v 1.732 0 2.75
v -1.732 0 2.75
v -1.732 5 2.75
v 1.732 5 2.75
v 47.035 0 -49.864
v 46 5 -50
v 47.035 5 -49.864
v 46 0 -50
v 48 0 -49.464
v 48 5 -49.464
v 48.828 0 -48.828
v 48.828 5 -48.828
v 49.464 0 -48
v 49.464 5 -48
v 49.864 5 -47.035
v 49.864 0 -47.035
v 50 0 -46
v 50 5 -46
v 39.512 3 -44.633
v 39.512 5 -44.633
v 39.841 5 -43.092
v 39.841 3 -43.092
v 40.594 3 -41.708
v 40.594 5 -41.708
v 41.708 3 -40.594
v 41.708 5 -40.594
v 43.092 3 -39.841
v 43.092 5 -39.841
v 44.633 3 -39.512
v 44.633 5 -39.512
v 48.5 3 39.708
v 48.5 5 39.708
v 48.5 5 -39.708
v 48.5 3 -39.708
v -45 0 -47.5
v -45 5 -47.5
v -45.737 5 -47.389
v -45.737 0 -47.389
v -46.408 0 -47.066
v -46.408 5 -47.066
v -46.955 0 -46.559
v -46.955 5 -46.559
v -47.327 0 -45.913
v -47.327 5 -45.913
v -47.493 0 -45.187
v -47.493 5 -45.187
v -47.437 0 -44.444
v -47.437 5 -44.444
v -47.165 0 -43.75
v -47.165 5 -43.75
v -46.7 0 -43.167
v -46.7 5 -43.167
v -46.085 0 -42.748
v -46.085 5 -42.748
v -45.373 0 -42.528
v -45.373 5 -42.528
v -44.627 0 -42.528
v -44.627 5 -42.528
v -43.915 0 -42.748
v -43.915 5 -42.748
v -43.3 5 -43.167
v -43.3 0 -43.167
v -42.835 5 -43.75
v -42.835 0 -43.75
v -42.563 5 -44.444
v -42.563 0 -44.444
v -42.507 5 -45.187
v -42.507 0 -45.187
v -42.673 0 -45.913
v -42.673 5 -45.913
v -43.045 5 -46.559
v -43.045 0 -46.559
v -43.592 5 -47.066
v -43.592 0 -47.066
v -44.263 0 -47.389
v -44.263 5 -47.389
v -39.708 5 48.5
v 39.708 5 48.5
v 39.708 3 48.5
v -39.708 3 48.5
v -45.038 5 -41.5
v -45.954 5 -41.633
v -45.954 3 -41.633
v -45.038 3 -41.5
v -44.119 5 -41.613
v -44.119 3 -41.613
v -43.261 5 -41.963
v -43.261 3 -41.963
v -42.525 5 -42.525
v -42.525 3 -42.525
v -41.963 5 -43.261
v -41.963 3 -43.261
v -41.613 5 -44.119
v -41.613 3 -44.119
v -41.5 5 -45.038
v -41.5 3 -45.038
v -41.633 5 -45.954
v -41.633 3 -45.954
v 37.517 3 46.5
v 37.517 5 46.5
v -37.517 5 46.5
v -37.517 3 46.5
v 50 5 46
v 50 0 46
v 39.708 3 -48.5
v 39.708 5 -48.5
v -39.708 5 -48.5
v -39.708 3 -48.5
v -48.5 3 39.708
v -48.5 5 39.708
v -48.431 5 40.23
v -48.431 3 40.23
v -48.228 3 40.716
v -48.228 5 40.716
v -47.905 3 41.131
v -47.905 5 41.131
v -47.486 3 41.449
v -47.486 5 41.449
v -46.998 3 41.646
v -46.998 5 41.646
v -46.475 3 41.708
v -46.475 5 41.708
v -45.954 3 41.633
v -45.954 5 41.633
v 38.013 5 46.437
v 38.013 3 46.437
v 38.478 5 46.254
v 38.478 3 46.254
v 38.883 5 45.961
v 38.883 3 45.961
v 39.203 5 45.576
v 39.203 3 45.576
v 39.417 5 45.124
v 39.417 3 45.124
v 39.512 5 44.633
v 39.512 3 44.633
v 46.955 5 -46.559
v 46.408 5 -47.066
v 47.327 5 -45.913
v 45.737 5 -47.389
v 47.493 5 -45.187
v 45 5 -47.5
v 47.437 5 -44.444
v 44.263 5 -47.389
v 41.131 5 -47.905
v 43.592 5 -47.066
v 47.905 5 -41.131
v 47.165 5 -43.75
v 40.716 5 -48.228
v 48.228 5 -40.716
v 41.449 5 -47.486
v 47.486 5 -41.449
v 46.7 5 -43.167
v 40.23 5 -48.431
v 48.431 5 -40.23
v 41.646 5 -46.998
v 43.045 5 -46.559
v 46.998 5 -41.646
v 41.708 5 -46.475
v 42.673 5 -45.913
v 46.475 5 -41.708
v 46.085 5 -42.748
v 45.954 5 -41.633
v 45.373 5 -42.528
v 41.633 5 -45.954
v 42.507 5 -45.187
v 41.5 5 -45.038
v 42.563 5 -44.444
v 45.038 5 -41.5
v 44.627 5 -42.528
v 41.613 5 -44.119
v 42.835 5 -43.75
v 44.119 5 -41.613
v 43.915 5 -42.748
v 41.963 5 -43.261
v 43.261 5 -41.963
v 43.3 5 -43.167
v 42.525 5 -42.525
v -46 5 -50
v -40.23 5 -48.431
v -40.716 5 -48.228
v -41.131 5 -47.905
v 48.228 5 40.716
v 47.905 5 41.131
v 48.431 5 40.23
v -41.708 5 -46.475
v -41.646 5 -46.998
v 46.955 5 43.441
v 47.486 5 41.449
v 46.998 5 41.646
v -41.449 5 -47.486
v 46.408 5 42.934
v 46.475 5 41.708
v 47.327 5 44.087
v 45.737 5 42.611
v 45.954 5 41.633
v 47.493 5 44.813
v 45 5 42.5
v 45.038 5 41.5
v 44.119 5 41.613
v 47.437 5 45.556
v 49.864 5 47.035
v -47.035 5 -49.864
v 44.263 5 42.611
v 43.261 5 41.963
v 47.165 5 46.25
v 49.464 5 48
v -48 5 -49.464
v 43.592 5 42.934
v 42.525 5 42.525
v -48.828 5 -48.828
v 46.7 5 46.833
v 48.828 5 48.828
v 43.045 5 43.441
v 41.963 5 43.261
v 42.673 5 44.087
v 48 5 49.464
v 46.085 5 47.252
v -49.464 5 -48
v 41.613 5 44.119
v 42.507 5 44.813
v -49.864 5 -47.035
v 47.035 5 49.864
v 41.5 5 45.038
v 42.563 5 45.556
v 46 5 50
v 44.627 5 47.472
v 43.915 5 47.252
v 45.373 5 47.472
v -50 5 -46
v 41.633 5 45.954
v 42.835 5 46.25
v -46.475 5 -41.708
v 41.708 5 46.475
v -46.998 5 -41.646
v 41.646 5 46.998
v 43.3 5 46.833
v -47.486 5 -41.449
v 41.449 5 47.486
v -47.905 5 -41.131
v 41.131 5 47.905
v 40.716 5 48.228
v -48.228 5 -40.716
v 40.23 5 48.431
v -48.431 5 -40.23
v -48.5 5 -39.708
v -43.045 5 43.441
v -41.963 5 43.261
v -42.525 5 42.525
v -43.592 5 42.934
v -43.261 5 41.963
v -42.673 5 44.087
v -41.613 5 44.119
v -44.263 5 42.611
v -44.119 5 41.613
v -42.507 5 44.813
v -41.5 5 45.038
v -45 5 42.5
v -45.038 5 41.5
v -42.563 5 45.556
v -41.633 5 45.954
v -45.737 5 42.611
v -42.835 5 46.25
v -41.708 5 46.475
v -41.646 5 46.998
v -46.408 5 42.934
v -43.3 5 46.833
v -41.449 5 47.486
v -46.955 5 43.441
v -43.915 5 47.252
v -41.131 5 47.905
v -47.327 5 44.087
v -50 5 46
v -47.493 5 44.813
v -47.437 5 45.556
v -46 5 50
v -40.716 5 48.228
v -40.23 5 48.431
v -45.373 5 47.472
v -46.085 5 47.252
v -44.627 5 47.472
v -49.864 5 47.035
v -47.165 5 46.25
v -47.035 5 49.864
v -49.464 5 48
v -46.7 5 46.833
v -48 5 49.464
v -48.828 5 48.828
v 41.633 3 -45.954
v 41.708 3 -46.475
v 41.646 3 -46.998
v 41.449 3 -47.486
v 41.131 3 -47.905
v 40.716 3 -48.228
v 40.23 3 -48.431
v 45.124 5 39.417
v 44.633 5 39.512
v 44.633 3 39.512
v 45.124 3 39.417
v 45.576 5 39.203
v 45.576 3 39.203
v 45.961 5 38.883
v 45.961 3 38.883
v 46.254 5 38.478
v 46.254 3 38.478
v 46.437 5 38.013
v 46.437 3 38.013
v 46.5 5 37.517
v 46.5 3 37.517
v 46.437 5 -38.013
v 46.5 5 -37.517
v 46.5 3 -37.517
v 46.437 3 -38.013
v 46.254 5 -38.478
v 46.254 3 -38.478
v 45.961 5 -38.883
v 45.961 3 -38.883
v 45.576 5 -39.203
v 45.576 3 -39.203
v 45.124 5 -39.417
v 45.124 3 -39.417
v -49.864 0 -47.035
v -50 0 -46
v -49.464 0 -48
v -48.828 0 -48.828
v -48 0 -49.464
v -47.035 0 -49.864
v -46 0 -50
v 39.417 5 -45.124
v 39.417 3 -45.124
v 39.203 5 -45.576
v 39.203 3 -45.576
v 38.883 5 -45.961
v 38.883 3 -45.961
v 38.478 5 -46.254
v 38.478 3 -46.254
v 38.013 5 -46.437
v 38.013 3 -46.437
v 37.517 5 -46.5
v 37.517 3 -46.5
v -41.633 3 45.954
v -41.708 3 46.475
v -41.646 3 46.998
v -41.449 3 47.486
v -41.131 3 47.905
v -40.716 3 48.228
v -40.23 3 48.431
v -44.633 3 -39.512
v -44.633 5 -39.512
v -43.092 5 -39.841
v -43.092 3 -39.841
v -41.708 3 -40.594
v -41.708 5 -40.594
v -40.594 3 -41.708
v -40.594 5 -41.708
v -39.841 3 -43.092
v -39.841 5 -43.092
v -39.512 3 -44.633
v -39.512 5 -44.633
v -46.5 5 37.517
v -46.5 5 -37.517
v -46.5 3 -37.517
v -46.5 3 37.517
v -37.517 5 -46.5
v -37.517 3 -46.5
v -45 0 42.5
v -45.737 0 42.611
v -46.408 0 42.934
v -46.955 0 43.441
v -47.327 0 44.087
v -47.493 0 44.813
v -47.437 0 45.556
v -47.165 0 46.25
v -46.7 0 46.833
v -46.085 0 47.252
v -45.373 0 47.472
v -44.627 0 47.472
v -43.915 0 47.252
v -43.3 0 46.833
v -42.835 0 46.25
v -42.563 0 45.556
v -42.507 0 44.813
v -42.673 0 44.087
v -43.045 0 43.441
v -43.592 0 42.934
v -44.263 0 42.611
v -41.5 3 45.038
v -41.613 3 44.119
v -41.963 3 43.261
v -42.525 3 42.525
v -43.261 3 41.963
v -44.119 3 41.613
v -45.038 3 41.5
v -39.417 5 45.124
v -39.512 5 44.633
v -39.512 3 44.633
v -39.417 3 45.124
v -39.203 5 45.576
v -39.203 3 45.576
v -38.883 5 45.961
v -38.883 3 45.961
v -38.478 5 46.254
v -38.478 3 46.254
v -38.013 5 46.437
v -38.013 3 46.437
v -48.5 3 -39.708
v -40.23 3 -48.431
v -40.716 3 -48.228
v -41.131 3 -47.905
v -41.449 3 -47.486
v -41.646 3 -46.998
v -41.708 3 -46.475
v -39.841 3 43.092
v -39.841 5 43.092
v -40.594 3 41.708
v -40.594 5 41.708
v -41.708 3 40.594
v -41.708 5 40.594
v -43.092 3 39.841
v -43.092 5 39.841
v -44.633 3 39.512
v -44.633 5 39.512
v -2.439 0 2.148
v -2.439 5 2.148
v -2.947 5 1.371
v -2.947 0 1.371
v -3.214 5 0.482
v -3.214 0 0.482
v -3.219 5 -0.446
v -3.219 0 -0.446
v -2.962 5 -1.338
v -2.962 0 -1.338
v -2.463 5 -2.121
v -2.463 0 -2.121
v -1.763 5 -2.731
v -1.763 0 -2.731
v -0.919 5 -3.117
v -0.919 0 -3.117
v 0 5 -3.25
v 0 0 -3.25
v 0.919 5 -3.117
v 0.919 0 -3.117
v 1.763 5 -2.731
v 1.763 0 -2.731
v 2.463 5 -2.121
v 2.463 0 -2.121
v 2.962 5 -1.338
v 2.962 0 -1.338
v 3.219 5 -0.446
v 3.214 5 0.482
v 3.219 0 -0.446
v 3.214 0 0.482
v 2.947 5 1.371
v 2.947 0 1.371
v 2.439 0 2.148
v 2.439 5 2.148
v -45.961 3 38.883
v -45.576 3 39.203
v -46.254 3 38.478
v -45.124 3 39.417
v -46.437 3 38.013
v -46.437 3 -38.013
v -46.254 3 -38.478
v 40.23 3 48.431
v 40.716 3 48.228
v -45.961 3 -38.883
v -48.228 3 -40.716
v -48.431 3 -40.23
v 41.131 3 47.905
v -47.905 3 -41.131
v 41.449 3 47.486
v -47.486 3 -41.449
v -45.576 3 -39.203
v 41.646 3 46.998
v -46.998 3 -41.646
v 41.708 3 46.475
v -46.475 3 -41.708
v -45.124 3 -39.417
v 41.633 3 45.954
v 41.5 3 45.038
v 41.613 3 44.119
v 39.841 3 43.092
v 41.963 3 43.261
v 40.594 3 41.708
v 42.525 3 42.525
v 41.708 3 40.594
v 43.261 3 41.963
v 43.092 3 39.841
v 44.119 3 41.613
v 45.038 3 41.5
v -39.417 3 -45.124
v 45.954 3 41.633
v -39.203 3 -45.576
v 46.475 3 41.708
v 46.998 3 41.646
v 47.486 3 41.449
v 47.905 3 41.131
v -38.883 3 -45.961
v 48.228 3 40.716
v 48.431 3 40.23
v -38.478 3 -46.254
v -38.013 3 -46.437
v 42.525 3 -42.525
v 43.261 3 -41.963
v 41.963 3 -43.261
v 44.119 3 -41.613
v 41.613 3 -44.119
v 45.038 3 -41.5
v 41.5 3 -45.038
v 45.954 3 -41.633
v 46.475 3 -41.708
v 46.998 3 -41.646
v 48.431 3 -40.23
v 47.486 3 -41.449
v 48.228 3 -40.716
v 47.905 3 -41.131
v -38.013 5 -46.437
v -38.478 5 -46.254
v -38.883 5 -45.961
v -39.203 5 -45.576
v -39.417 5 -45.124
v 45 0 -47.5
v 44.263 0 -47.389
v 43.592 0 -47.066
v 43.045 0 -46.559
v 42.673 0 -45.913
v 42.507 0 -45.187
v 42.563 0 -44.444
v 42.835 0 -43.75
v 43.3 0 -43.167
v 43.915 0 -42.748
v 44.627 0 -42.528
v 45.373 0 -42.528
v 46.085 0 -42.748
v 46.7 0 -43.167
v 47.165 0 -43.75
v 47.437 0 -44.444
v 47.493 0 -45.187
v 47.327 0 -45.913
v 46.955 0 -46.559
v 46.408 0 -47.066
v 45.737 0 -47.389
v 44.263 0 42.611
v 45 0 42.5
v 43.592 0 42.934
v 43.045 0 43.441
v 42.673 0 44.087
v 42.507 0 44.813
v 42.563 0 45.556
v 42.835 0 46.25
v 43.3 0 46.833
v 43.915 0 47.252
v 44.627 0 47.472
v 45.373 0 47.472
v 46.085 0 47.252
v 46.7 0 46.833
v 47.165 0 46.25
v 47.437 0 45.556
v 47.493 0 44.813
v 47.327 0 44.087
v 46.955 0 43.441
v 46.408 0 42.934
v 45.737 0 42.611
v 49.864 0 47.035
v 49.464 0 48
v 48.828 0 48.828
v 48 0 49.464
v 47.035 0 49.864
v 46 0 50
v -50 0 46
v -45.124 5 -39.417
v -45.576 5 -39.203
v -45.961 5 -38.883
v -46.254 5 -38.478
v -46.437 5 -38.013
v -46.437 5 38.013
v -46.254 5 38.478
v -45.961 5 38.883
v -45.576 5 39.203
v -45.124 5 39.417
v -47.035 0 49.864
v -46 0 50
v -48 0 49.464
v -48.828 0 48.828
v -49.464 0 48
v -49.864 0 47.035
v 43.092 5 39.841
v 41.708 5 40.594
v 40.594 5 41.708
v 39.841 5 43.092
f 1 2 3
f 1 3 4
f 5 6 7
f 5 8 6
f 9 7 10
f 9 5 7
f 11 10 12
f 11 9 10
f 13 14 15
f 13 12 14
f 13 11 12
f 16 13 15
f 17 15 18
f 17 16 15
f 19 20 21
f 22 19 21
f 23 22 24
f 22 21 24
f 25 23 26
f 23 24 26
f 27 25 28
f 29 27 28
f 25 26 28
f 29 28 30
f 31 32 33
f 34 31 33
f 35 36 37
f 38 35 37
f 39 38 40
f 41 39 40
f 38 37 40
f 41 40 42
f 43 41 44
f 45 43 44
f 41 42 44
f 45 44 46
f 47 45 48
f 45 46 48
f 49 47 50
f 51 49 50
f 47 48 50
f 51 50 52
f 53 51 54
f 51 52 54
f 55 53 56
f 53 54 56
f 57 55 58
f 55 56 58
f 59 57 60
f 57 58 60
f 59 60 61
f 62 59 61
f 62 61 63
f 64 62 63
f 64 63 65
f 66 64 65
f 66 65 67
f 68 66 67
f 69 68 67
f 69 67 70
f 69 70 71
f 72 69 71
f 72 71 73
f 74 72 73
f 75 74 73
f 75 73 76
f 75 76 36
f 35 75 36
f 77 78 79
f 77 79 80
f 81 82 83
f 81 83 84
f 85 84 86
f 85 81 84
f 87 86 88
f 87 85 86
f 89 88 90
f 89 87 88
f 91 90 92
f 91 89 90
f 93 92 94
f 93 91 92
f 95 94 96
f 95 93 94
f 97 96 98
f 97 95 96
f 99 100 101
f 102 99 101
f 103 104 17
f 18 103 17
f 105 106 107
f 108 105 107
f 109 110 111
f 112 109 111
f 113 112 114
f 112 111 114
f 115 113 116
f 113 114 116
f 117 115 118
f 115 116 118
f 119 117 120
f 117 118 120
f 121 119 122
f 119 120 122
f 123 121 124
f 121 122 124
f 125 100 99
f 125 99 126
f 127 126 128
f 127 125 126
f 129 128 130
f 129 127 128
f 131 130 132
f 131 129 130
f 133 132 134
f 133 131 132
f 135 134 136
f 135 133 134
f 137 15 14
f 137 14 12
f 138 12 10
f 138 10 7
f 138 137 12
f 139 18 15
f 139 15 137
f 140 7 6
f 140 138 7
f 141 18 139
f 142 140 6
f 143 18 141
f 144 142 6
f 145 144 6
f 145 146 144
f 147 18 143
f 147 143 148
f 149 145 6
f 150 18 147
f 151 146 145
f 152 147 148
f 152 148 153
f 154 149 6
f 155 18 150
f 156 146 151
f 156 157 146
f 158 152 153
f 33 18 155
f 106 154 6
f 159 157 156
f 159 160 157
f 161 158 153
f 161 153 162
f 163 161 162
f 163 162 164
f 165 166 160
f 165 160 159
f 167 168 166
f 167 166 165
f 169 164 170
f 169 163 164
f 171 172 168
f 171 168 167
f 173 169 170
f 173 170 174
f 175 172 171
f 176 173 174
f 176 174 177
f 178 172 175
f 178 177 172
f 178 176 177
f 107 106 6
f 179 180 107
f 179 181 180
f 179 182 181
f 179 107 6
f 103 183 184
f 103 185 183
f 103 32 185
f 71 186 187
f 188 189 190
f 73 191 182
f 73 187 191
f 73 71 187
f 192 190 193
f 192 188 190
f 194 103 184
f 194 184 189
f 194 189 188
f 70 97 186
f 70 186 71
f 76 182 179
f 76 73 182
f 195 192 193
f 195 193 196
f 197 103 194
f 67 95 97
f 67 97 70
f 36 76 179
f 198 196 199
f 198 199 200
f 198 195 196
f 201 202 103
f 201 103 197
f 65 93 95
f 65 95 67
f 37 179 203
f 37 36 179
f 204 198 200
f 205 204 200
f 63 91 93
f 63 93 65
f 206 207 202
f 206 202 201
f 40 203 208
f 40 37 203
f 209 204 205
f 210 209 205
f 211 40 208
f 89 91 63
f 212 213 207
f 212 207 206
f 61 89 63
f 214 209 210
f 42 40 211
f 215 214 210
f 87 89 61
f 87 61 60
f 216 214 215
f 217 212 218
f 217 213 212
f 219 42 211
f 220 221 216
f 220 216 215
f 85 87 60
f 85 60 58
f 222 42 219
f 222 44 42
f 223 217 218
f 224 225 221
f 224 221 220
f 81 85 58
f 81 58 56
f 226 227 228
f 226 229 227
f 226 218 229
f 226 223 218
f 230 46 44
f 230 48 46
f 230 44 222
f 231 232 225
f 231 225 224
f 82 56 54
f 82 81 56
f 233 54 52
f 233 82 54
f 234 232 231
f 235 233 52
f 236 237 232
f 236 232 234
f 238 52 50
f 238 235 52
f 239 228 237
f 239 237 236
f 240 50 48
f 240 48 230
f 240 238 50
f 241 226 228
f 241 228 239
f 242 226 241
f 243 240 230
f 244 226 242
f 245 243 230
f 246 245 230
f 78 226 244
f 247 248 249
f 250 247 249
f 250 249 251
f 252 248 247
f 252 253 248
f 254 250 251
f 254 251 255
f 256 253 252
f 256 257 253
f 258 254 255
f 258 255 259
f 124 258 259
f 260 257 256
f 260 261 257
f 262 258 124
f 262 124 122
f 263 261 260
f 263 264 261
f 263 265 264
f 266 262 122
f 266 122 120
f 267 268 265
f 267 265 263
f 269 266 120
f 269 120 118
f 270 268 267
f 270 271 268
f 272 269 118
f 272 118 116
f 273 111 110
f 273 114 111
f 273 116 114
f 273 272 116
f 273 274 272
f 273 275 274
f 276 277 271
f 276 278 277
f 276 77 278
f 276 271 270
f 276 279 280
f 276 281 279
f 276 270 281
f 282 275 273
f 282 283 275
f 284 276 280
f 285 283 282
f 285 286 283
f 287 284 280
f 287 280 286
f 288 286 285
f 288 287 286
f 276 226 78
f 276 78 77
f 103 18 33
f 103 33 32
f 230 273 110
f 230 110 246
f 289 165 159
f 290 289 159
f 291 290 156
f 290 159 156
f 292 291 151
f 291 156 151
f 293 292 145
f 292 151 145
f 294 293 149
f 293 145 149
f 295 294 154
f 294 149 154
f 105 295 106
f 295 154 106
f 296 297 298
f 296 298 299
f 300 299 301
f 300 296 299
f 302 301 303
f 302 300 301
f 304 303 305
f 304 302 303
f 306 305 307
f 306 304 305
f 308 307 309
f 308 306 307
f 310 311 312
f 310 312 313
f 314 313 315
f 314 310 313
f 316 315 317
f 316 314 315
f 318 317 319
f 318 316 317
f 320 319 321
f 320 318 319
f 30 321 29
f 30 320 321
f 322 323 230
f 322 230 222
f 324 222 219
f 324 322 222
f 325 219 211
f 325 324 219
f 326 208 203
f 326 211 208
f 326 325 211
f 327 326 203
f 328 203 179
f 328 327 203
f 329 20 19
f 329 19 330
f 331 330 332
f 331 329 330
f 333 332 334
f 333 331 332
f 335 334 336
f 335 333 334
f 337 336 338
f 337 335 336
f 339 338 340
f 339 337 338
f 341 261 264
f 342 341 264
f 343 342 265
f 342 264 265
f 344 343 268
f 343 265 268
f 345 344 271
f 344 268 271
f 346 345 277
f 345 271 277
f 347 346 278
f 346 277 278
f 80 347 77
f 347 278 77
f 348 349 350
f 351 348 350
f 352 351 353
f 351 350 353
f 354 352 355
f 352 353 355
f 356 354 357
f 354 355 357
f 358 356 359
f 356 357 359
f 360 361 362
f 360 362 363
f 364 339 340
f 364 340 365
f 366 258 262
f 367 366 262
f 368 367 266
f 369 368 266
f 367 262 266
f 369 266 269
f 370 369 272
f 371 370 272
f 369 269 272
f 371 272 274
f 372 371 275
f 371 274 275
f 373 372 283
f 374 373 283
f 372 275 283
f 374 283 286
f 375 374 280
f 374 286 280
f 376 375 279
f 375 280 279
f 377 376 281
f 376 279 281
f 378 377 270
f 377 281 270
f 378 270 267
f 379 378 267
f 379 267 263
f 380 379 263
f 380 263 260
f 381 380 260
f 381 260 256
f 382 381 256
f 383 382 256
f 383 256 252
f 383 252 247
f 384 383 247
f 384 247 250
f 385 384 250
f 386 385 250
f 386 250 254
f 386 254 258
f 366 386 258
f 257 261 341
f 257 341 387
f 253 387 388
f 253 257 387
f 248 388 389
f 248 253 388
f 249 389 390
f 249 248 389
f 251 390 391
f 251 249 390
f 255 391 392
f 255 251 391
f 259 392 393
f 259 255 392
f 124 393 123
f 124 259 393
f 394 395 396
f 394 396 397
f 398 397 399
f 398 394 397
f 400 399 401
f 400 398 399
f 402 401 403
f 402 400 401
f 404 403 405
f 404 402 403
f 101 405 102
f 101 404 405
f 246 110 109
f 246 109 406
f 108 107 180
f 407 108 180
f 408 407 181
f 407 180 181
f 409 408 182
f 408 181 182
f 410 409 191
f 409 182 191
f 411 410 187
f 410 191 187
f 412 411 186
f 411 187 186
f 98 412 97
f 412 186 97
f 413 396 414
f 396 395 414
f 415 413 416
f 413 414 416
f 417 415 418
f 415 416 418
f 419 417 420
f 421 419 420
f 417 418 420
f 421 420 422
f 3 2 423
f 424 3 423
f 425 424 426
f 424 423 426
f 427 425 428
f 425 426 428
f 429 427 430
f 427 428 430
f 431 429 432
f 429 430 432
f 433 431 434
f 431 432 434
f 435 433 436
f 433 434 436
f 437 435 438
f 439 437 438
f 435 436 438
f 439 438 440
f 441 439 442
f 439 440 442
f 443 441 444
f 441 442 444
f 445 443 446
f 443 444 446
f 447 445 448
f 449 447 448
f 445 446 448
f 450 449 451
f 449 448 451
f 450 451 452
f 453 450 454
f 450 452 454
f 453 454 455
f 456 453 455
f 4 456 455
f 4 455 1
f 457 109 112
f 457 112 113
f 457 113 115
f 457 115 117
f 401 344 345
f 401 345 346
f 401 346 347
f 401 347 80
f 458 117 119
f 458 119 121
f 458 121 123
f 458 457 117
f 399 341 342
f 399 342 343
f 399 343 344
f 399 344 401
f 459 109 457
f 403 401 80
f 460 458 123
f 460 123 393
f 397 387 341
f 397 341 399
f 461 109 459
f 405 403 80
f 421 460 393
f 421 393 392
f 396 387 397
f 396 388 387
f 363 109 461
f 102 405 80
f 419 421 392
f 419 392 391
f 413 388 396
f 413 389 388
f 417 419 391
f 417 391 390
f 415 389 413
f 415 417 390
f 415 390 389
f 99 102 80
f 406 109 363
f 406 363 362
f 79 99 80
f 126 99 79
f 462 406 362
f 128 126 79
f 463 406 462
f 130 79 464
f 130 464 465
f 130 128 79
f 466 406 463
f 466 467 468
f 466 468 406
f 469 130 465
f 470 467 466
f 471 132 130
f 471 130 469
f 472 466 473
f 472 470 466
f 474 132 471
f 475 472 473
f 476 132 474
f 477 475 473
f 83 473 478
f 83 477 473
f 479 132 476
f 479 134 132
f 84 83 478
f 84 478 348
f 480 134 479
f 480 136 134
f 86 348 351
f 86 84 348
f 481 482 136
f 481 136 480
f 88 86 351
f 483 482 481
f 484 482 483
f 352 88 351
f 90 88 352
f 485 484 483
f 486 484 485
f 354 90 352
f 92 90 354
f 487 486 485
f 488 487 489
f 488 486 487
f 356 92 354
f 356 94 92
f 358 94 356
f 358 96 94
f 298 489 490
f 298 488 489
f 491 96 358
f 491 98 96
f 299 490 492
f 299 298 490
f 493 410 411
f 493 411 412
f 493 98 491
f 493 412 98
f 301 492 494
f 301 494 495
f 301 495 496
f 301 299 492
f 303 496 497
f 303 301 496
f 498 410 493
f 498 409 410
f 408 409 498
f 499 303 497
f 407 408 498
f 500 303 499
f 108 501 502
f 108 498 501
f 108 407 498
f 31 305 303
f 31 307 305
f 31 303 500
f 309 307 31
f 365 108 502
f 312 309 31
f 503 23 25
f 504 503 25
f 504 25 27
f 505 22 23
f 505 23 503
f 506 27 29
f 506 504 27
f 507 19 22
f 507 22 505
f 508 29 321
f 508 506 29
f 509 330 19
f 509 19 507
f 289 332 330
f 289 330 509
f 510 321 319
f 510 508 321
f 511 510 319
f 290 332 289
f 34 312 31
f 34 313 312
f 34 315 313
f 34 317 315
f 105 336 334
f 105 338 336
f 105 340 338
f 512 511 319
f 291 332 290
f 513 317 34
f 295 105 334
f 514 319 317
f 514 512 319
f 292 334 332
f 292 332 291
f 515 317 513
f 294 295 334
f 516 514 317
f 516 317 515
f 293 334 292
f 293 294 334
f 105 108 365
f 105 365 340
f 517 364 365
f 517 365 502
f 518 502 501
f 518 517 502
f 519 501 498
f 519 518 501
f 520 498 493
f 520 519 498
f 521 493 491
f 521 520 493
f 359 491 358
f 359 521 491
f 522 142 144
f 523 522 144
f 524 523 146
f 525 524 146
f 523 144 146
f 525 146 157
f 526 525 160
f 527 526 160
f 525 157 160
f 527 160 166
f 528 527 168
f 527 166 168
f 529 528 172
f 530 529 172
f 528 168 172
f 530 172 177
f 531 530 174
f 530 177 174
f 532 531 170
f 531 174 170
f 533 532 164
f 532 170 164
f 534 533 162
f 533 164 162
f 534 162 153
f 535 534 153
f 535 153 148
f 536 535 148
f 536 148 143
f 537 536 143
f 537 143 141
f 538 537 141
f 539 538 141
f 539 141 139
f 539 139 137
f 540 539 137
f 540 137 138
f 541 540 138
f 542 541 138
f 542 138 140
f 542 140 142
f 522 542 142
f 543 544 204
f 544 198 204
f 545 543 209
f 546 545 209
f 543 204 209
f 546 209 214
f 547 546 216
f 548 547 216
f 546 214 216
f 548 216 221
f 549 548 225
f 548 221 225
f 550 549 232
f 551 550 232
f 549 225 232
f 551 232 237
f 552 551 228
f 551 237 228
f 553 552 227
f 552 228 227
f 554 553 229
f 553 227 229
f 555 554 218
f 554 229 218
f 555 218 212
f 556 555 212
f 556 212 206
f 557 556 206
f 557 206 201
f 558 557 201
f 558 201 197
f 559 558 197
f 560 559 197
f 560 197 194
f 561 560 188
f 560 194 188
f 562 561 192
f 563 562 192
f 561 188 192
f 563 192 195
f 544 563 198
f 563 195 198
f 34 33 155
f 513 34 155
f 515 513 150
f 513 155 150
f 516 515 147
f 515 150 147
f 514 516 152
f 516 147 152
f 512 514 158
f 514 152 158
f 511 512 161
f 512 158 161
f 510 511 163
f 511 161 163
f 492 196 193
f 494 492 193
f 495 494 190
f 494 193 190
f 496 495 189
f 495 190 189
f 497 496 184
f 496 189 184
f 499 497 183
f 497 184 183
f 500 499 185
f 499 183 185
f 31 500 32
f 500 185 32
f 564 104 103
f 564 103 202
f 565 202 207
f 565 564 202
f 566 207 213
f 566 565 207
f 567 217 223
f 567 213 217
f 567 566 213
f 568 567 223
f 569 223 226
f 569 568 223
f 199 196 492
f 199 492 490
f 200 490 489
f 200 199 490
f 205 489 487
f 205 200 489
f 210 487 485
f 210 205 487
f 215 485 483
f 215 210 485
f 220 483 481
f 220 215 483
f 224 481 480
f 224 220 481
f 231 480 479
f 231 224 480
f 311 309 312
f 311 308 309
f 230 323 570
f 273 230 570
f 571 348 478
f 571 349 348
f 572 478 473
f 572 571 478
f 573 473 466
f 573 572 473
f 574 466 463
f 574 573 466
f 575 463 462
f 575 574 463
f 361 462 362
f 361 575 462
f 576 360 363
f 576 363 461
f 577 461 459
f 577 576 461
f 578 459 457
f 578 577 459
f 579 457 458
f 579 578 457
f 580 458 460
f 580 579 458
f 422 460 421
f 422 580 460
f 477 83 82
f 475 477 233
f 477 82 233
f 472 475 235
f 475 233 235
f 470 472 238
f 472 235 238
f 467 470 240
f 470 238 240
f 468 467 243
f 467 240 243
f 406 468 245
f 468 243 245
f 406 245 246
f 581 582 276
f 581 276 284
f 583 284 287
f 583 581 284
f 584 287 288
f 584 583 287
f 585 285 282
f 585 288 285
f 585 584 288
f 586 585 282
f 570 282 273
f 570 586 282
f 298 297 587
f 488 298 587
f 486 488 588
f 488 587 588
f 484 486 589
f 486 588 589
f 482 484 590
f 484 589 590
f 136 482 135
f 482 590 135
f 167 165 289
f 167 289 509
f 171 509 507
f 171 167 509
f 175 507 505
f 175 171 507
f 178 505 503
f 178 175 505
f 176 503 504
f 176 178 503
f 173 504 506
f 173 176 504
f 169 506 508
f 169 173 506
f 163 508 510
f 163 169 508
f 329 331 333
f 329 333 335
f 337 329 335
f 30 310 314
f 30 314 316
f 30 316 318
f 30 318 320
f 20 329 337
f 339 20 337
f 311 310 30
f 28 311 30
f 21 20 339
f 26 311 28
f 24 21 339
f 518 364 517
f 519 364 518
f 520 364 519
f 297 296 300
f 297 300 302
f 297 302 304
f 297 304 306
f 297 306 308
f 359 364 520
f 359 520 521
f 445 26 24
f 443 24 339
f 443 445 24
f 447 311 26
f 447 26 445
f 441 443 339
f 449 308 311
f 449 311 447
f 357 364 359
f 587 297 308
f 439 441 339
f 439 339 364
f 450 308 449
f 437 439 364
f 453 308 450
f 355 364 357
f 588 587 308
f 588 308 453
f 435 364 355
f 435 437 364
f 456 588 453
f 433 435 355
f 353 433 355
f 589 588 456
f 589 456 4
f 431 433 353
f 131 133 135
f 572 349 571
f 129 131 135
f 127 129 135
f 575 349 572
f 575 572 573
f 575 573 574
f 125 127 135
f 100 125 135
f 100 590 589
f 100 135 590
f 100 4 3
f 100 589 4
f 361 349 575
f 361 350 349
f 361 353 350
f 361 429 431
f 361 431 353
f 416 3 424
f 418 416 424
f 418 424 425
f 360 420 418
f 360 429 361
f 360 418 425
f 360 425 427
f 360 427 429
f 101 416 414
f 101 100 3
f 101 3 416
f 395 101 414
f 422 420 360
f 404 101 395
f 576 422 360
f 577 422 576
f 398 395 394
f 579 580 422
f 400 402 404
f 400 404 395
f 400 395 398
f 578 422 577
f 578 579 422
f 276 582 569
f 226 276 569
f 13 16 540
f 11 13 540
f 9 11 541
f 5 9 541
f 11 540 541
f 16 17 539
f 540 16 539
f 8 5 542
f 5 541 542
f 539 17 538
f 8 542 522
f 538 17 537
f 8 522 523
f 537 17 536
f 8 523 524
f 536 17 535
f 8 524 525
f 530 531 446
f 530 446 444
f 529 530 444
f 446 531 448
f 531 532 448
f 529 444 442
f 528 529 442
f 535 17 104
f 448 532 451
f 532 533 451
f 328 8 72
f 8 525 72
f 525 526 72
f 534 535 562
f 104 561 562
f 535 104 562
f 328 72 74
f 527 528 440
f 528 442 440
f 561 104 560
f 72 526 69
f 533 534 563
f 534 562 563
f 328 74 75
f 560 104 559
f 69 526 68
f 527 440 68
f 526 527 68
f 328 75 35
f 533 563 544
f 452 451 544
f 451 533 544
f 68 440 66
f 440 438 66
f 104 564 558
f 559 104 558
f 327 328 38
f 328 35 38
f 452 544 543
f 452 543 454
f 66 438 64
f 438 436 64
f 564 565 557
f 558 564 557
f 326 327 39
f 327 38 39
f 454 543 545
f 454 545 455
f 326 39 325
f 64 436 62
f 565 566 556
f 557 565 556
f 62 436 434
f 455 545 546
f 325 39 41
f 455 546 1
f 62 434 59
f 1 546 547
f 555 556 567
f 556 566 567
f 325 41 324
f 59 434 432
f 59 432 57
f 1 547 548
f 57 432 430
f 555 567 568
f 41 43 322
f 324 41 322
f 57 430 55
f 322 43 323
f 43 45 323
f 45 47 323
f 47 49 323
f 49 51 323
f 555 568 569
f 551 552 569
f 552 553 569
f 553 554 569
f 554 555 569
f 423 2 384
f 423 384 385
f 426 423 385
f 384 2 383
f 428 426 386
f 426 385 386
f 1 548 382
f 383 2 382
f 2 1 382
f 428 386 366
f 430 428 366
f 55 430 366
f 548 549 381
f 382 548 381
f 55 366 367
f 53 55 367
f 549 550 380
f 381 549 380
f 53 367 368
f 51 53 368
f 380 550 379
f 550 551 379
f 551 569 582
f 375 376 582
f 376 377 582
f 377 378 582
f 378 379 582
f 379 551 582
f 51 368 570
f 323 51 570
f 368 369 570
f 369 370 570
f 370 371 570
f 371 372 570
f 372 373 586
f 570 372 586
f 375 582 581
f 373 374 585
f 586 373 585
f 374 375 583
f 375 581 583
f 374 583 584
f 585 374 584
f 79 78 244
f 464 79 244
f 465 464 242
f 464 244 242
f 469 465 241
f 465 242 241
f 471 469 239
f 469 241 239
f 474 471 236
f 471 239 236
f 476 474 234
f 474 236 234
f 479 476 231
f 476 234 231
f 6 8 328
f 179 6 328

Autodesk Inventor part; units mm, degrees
ref_plane "YZ Plane" through (0, 0, 0) normal (1, 0, 0) x (0, 1, 0)
ref_plane "XZ Plane" through (0, 0, 0) normal (0, 1, 0) x (-1, 0, 0)
ref_plane "XY Plane" through (0, 0, 0) normal (0, 0, 1) x (1, 0, 0)
sketch "Sketch2" plane through (0, 0, 0) normal (0, 1, 0) x (-1, 0, 0)
  line L0 (-46, -50) -> (46, -50)
  line L1 (50, -46) -> (50, 46)
  line L2 (46, 50) -> (-46, 50)
  line L3 (-50, 46) -> (-50, -46)
  line L4 (-50, -50) -> (50, 50) construction
  line L5 (50, -50) -> (-50, 50) construction
  arc A0 (50, 46) -> (46, 50) centre (46, 46) ccw
  arc A1 (-46, 50) -> (-50, 46) centre (-46, 46) ccw
  arc A2 (-50, -46) -> (-46, -50) centre (-46, -46) ccw
  arc A3 (46, -50) -> (50, -46) centre (46, -46) ccw
  point P0 (0, 0)
  dimension "d0" = 100
  dimension "d1" = 100
  dimension "d4" = 4
  dimension "d5" = 4
extrude "Extrusion1" add sketch "Sketch2" along normal blind 5
sketch "Sketch3" plane through (0, 0, 0) normal (0, -1, 0) x (1, 0, 0)
  arc A0 (-50, -46) -> (-46, -50) centre (-46, -46) ccw construction
  line L0 (46, -50) -> (-46, -50) construction
  arc A1 (46, -50) -> (50, -46) centre (46, -46) ccw construction
  line L1 (50, 46) -> (50, -46) construction
  arc A2 (50, 46) -> (46, 50) centre (46, 46) ccw construction
  line L2 (-46, 50) -> (46, 50) construction
  arc A3 (-46, 50) -> (-50, 46) centre (-46, 46) ccw construction
  line L3 (-50, -46) -> (-50, 46) construction
  point P0 (0, 0)
  point P1 (-45, 45)
  point P2 (45, 45)
  point P3 (-45, -45)
  point P4 (45, -45)
  dimension "d13" = 5
  dimension "d14" = 5
  dimension "d17" = 90
  dimension "d20" = 90
hole "Hole1" at (-45, 0, 45) at (45, 0, 45) at (45, 0, -45) at (-45, 0, -45) direction (0, 1, 0) diameter 5 depth 14.2 tip angle 118
sketch "Sketch4" plane through (0, 5, 0) normal (0, 1, 0) x (1, 0, 0)
  circle A0 centre (45, 45) radius 2.5 construction
  circle A1 centre (-45, -45) radius 2.5 construction
  circle A2 centre (45, -45) radius 2.5 construction
  circle A3 centre (-45, 45) radius 2.5 construction
  arc A4 (-46, 50) -> (-50, 46) centre (-46, 46) ccw construction
  line L0 (-50, 46) -> (-50, -46) construction
  arc A5 (-50, -46) -> (-46, -50) centre (-46, -46) ccw construction
  line L1 (-46, -50) -> (46, -50) construction
  arc A6 (46, -50) -> (50, -46) centre (46, -46) ccw construction
  line L2 (50, -46) -> (50, 46) construction
  arc A7 (50, 46) -> (46, 50) centre (46, 46) ccw construction
  line L3 (46, 50) -> (-46, 50) construction
  arc A8 (44.6333, -39.5122) -> (39.5122, -44.6333) centre (45, -45) ccw
  arc A9 (45.9545, -41.6327) -> (41.6327, -45.9545) centre (45, -45) ccw
  line L4 (39.7085, -48.5) -> (-39.7085, -48.5)
  line L5 (48.5, -39.7085) -> (48.5, 39.7085)
  line L6 (46.5, -37.5167) -> (46.5, 37.5167)
  line L7 (0, -72.209) -> (0, 64.6676) construction
  line L8 (107.9328, 0) -> (-102.5907, 0) construction
  line L9 (37.5167, -46.5) -> (-37.5167, -46.5)
  arc A10 (-39.5122, -44.6333) -> (-44.6333, -39.5122) centre (-45, -45) ccw
  arc A11 (-41.6327, -45.9545) -> (-45.9545, -41.6327) centre (-45, -45) ccw
  line L10 (-48.5, -39.7085) -> (-48.5, 39.7085)
  line L11 (-46.5, 37.5167) -> (-46.5, -37.5167)
  arc A12 (41.6327, 45.9545) -> (45.9545, 41.6327) centre (45, 45) ccw
  arc A13 (39.5122, 44.6333) -> (44.6333, 39.5122) centre (45, 45) ccw
  line L12 (39.7085, 48.5) -> (-39.7085, 48.5)
  line L13 (37.5167, 46.5) -> (-37.5167, 46.5)
  line L14 (46, 50) -> (-46, 50) construction
  arc A14 (-44.6333, 39.5122) -> (-39.5122, 44.6333) centre (-45, 45) ccw
  arc A15 (-45.9545, 41.6327) -> (-41.6327, 45.9545) centre (-45, 45) ccw
  arc A16 (39.7085, -48.5) -> (41.6327, -45.9545) centre (39.7085, -46.5) ccw
  arc A17 (37.5167, -46.5) -> (39.5122, -44.6333) centre (37.5167, -44.5) ccw
  arc A18 (45.9545, -41.6327) -> (48.5, -39.7085) centre (46.5, -39.7085) ccw
  arc A19 (44.6333, -39.5122) -> (46.5, -37.5167) centre (44.5, -37.5167) ccw
  arc A20 (-41.6327, -45.9545) -> (-39.7085, -48.5) centre (-39.7085, -46.5) ccw
  arc A21 (-39.5122, -44.6333) -> (-37.5167, -46.5) centre (-37.5167, -44.5) ccw
  arc A22 (-48.5, -39.7085) -> (-45.9545, -41.6327) centre (-46.5, -39.7085) ccw
  arc A23 (-46.5, -37.5167) -> (-44.6333, -39.5122) centre (-44.5, -37.5167) ccw
  arc A24 (-44.6333, 39.5122) -> (-46.5, 37.5167) centre (-44.5, 37.5167) ccw
  arc A25 (-45.9545, 41.6327) -> (-48.5, 39.7085) centre (-46.5, 39.7085) ccw
  arc A26 (-39.7085, 48.5) -> (-41.6327, 45.9545) centre (-39.7085, 46.5) ccw
  arc A27 (-37.5167, 46.5) -> (-39.5122, 44.6333) centre (-37.5167, 44.5) ccw
  arc A28 (41.6327, 45.9545) -> (39.7085, 48.5) centre (39.7085, 46.5) ccw
  arc A29 (39.5122, 44.6333) -> (37.5167, 46.5) centre (37.5167, 44.5) ccw
  arc A30 (48.5, 39.7085) -> (45.9545, 41.6327) centre (46.5, 39.7085) ccw
  arc A31 (46.5, 37.5167) -> (44.6333, 39.5122) centre (44.5, 37.5167) ccw
  point P0 (0, 0)
  point P1 (45, -48.5)
  point P2 (39.7085, -46.5)
  point P3 (48.5, -45)
  point P4 (48.5, 45)
  point P5 (46.5, -39.7085)
  point P6 (46.5, 39.7085)
  point P7 (-45, -48.5)
  point P8 (-48.5, -45)
  point P9 (-46.5, 39.7085)
  point P10 (-46.5, -39.7085)
  point P11 (45, 48.5)
  point P12 (-45, 48.5)
  point P13 (39.7085, 46.5)
  point P14 (-39.7085, 46.5)
  point P15 (-48.5, 45)
  dimension "d23" = 5.5
  dimension "d24" = 3.5
  dimension "d25" = 1.5
  dimension "d27" = 1.5
  dimension "d28" = 2
  dimension "d31" = 5.5
  dimension "d32" = 3.5
  dimension "d33" = 2
  dimension "d34" = 1.5
  dimension "d35" = 2
  dimension "d36" = 5.5
  dimension "d37" = 3.5
  dimension "d38" = 1.5
  dimension "d39" = 2
  dimension "d41" = 5.5
  dimension "d42" = 3.5
  dimension "d43" = 2
  dimension "d44" = 2
  dimension "d45" = 2
extrude "Extrusion2" cut sketch "Sketch4" against normal blind 2
sketch "Sketch5" plane through (0, 0, 0) normal (0, -1, 0) x (1, 0, 0)
  circle A0 centre (45, -45) radius 2.5 construction
  circle A1 centre (-45, 45) radius 2.5 construction
  circle A2 centre (45, 45) radius 2.5 construction
  circle A3 centre (-45, -45) radius 2.5 construction
  arc A4 (-50, -46) -> (-46, -50) centre (-46, -46) ccw construction
  line L0 (46, -50) -> (-46, -50) construction
  arc A5 (46, -50) -> (50, -46) centre (46, -46) ccw construction
  line L1 (50, 46) -> (50, -46) construction
  arc A6 (50, 46) -> (46, 50) centre (46, 46) ccw construction
  line L2 (-46, 50) -> (46, 50) construction
  arc A7 (-46, 50) -> (-50, 46) centre (-46, 46) ccw construction
  line L3 (-50, -46) -> (-50, 46) construction
  arc A8 (-1.7321, 2.75) -> (1.7321, 2.75) centre (0, 0) ccw
  line L4 (-1.7321, 2.75) -> (1.7321, 2.75)
  dimension "d48" = 50
  dimension "d49" = 50
  dimension "d50" = 6.5
  dimension "d51" = 6
extrude "Extrusion3" cut sketch "Sketch5" against normal through all
properties part number "P035_FondBoitierv3"
